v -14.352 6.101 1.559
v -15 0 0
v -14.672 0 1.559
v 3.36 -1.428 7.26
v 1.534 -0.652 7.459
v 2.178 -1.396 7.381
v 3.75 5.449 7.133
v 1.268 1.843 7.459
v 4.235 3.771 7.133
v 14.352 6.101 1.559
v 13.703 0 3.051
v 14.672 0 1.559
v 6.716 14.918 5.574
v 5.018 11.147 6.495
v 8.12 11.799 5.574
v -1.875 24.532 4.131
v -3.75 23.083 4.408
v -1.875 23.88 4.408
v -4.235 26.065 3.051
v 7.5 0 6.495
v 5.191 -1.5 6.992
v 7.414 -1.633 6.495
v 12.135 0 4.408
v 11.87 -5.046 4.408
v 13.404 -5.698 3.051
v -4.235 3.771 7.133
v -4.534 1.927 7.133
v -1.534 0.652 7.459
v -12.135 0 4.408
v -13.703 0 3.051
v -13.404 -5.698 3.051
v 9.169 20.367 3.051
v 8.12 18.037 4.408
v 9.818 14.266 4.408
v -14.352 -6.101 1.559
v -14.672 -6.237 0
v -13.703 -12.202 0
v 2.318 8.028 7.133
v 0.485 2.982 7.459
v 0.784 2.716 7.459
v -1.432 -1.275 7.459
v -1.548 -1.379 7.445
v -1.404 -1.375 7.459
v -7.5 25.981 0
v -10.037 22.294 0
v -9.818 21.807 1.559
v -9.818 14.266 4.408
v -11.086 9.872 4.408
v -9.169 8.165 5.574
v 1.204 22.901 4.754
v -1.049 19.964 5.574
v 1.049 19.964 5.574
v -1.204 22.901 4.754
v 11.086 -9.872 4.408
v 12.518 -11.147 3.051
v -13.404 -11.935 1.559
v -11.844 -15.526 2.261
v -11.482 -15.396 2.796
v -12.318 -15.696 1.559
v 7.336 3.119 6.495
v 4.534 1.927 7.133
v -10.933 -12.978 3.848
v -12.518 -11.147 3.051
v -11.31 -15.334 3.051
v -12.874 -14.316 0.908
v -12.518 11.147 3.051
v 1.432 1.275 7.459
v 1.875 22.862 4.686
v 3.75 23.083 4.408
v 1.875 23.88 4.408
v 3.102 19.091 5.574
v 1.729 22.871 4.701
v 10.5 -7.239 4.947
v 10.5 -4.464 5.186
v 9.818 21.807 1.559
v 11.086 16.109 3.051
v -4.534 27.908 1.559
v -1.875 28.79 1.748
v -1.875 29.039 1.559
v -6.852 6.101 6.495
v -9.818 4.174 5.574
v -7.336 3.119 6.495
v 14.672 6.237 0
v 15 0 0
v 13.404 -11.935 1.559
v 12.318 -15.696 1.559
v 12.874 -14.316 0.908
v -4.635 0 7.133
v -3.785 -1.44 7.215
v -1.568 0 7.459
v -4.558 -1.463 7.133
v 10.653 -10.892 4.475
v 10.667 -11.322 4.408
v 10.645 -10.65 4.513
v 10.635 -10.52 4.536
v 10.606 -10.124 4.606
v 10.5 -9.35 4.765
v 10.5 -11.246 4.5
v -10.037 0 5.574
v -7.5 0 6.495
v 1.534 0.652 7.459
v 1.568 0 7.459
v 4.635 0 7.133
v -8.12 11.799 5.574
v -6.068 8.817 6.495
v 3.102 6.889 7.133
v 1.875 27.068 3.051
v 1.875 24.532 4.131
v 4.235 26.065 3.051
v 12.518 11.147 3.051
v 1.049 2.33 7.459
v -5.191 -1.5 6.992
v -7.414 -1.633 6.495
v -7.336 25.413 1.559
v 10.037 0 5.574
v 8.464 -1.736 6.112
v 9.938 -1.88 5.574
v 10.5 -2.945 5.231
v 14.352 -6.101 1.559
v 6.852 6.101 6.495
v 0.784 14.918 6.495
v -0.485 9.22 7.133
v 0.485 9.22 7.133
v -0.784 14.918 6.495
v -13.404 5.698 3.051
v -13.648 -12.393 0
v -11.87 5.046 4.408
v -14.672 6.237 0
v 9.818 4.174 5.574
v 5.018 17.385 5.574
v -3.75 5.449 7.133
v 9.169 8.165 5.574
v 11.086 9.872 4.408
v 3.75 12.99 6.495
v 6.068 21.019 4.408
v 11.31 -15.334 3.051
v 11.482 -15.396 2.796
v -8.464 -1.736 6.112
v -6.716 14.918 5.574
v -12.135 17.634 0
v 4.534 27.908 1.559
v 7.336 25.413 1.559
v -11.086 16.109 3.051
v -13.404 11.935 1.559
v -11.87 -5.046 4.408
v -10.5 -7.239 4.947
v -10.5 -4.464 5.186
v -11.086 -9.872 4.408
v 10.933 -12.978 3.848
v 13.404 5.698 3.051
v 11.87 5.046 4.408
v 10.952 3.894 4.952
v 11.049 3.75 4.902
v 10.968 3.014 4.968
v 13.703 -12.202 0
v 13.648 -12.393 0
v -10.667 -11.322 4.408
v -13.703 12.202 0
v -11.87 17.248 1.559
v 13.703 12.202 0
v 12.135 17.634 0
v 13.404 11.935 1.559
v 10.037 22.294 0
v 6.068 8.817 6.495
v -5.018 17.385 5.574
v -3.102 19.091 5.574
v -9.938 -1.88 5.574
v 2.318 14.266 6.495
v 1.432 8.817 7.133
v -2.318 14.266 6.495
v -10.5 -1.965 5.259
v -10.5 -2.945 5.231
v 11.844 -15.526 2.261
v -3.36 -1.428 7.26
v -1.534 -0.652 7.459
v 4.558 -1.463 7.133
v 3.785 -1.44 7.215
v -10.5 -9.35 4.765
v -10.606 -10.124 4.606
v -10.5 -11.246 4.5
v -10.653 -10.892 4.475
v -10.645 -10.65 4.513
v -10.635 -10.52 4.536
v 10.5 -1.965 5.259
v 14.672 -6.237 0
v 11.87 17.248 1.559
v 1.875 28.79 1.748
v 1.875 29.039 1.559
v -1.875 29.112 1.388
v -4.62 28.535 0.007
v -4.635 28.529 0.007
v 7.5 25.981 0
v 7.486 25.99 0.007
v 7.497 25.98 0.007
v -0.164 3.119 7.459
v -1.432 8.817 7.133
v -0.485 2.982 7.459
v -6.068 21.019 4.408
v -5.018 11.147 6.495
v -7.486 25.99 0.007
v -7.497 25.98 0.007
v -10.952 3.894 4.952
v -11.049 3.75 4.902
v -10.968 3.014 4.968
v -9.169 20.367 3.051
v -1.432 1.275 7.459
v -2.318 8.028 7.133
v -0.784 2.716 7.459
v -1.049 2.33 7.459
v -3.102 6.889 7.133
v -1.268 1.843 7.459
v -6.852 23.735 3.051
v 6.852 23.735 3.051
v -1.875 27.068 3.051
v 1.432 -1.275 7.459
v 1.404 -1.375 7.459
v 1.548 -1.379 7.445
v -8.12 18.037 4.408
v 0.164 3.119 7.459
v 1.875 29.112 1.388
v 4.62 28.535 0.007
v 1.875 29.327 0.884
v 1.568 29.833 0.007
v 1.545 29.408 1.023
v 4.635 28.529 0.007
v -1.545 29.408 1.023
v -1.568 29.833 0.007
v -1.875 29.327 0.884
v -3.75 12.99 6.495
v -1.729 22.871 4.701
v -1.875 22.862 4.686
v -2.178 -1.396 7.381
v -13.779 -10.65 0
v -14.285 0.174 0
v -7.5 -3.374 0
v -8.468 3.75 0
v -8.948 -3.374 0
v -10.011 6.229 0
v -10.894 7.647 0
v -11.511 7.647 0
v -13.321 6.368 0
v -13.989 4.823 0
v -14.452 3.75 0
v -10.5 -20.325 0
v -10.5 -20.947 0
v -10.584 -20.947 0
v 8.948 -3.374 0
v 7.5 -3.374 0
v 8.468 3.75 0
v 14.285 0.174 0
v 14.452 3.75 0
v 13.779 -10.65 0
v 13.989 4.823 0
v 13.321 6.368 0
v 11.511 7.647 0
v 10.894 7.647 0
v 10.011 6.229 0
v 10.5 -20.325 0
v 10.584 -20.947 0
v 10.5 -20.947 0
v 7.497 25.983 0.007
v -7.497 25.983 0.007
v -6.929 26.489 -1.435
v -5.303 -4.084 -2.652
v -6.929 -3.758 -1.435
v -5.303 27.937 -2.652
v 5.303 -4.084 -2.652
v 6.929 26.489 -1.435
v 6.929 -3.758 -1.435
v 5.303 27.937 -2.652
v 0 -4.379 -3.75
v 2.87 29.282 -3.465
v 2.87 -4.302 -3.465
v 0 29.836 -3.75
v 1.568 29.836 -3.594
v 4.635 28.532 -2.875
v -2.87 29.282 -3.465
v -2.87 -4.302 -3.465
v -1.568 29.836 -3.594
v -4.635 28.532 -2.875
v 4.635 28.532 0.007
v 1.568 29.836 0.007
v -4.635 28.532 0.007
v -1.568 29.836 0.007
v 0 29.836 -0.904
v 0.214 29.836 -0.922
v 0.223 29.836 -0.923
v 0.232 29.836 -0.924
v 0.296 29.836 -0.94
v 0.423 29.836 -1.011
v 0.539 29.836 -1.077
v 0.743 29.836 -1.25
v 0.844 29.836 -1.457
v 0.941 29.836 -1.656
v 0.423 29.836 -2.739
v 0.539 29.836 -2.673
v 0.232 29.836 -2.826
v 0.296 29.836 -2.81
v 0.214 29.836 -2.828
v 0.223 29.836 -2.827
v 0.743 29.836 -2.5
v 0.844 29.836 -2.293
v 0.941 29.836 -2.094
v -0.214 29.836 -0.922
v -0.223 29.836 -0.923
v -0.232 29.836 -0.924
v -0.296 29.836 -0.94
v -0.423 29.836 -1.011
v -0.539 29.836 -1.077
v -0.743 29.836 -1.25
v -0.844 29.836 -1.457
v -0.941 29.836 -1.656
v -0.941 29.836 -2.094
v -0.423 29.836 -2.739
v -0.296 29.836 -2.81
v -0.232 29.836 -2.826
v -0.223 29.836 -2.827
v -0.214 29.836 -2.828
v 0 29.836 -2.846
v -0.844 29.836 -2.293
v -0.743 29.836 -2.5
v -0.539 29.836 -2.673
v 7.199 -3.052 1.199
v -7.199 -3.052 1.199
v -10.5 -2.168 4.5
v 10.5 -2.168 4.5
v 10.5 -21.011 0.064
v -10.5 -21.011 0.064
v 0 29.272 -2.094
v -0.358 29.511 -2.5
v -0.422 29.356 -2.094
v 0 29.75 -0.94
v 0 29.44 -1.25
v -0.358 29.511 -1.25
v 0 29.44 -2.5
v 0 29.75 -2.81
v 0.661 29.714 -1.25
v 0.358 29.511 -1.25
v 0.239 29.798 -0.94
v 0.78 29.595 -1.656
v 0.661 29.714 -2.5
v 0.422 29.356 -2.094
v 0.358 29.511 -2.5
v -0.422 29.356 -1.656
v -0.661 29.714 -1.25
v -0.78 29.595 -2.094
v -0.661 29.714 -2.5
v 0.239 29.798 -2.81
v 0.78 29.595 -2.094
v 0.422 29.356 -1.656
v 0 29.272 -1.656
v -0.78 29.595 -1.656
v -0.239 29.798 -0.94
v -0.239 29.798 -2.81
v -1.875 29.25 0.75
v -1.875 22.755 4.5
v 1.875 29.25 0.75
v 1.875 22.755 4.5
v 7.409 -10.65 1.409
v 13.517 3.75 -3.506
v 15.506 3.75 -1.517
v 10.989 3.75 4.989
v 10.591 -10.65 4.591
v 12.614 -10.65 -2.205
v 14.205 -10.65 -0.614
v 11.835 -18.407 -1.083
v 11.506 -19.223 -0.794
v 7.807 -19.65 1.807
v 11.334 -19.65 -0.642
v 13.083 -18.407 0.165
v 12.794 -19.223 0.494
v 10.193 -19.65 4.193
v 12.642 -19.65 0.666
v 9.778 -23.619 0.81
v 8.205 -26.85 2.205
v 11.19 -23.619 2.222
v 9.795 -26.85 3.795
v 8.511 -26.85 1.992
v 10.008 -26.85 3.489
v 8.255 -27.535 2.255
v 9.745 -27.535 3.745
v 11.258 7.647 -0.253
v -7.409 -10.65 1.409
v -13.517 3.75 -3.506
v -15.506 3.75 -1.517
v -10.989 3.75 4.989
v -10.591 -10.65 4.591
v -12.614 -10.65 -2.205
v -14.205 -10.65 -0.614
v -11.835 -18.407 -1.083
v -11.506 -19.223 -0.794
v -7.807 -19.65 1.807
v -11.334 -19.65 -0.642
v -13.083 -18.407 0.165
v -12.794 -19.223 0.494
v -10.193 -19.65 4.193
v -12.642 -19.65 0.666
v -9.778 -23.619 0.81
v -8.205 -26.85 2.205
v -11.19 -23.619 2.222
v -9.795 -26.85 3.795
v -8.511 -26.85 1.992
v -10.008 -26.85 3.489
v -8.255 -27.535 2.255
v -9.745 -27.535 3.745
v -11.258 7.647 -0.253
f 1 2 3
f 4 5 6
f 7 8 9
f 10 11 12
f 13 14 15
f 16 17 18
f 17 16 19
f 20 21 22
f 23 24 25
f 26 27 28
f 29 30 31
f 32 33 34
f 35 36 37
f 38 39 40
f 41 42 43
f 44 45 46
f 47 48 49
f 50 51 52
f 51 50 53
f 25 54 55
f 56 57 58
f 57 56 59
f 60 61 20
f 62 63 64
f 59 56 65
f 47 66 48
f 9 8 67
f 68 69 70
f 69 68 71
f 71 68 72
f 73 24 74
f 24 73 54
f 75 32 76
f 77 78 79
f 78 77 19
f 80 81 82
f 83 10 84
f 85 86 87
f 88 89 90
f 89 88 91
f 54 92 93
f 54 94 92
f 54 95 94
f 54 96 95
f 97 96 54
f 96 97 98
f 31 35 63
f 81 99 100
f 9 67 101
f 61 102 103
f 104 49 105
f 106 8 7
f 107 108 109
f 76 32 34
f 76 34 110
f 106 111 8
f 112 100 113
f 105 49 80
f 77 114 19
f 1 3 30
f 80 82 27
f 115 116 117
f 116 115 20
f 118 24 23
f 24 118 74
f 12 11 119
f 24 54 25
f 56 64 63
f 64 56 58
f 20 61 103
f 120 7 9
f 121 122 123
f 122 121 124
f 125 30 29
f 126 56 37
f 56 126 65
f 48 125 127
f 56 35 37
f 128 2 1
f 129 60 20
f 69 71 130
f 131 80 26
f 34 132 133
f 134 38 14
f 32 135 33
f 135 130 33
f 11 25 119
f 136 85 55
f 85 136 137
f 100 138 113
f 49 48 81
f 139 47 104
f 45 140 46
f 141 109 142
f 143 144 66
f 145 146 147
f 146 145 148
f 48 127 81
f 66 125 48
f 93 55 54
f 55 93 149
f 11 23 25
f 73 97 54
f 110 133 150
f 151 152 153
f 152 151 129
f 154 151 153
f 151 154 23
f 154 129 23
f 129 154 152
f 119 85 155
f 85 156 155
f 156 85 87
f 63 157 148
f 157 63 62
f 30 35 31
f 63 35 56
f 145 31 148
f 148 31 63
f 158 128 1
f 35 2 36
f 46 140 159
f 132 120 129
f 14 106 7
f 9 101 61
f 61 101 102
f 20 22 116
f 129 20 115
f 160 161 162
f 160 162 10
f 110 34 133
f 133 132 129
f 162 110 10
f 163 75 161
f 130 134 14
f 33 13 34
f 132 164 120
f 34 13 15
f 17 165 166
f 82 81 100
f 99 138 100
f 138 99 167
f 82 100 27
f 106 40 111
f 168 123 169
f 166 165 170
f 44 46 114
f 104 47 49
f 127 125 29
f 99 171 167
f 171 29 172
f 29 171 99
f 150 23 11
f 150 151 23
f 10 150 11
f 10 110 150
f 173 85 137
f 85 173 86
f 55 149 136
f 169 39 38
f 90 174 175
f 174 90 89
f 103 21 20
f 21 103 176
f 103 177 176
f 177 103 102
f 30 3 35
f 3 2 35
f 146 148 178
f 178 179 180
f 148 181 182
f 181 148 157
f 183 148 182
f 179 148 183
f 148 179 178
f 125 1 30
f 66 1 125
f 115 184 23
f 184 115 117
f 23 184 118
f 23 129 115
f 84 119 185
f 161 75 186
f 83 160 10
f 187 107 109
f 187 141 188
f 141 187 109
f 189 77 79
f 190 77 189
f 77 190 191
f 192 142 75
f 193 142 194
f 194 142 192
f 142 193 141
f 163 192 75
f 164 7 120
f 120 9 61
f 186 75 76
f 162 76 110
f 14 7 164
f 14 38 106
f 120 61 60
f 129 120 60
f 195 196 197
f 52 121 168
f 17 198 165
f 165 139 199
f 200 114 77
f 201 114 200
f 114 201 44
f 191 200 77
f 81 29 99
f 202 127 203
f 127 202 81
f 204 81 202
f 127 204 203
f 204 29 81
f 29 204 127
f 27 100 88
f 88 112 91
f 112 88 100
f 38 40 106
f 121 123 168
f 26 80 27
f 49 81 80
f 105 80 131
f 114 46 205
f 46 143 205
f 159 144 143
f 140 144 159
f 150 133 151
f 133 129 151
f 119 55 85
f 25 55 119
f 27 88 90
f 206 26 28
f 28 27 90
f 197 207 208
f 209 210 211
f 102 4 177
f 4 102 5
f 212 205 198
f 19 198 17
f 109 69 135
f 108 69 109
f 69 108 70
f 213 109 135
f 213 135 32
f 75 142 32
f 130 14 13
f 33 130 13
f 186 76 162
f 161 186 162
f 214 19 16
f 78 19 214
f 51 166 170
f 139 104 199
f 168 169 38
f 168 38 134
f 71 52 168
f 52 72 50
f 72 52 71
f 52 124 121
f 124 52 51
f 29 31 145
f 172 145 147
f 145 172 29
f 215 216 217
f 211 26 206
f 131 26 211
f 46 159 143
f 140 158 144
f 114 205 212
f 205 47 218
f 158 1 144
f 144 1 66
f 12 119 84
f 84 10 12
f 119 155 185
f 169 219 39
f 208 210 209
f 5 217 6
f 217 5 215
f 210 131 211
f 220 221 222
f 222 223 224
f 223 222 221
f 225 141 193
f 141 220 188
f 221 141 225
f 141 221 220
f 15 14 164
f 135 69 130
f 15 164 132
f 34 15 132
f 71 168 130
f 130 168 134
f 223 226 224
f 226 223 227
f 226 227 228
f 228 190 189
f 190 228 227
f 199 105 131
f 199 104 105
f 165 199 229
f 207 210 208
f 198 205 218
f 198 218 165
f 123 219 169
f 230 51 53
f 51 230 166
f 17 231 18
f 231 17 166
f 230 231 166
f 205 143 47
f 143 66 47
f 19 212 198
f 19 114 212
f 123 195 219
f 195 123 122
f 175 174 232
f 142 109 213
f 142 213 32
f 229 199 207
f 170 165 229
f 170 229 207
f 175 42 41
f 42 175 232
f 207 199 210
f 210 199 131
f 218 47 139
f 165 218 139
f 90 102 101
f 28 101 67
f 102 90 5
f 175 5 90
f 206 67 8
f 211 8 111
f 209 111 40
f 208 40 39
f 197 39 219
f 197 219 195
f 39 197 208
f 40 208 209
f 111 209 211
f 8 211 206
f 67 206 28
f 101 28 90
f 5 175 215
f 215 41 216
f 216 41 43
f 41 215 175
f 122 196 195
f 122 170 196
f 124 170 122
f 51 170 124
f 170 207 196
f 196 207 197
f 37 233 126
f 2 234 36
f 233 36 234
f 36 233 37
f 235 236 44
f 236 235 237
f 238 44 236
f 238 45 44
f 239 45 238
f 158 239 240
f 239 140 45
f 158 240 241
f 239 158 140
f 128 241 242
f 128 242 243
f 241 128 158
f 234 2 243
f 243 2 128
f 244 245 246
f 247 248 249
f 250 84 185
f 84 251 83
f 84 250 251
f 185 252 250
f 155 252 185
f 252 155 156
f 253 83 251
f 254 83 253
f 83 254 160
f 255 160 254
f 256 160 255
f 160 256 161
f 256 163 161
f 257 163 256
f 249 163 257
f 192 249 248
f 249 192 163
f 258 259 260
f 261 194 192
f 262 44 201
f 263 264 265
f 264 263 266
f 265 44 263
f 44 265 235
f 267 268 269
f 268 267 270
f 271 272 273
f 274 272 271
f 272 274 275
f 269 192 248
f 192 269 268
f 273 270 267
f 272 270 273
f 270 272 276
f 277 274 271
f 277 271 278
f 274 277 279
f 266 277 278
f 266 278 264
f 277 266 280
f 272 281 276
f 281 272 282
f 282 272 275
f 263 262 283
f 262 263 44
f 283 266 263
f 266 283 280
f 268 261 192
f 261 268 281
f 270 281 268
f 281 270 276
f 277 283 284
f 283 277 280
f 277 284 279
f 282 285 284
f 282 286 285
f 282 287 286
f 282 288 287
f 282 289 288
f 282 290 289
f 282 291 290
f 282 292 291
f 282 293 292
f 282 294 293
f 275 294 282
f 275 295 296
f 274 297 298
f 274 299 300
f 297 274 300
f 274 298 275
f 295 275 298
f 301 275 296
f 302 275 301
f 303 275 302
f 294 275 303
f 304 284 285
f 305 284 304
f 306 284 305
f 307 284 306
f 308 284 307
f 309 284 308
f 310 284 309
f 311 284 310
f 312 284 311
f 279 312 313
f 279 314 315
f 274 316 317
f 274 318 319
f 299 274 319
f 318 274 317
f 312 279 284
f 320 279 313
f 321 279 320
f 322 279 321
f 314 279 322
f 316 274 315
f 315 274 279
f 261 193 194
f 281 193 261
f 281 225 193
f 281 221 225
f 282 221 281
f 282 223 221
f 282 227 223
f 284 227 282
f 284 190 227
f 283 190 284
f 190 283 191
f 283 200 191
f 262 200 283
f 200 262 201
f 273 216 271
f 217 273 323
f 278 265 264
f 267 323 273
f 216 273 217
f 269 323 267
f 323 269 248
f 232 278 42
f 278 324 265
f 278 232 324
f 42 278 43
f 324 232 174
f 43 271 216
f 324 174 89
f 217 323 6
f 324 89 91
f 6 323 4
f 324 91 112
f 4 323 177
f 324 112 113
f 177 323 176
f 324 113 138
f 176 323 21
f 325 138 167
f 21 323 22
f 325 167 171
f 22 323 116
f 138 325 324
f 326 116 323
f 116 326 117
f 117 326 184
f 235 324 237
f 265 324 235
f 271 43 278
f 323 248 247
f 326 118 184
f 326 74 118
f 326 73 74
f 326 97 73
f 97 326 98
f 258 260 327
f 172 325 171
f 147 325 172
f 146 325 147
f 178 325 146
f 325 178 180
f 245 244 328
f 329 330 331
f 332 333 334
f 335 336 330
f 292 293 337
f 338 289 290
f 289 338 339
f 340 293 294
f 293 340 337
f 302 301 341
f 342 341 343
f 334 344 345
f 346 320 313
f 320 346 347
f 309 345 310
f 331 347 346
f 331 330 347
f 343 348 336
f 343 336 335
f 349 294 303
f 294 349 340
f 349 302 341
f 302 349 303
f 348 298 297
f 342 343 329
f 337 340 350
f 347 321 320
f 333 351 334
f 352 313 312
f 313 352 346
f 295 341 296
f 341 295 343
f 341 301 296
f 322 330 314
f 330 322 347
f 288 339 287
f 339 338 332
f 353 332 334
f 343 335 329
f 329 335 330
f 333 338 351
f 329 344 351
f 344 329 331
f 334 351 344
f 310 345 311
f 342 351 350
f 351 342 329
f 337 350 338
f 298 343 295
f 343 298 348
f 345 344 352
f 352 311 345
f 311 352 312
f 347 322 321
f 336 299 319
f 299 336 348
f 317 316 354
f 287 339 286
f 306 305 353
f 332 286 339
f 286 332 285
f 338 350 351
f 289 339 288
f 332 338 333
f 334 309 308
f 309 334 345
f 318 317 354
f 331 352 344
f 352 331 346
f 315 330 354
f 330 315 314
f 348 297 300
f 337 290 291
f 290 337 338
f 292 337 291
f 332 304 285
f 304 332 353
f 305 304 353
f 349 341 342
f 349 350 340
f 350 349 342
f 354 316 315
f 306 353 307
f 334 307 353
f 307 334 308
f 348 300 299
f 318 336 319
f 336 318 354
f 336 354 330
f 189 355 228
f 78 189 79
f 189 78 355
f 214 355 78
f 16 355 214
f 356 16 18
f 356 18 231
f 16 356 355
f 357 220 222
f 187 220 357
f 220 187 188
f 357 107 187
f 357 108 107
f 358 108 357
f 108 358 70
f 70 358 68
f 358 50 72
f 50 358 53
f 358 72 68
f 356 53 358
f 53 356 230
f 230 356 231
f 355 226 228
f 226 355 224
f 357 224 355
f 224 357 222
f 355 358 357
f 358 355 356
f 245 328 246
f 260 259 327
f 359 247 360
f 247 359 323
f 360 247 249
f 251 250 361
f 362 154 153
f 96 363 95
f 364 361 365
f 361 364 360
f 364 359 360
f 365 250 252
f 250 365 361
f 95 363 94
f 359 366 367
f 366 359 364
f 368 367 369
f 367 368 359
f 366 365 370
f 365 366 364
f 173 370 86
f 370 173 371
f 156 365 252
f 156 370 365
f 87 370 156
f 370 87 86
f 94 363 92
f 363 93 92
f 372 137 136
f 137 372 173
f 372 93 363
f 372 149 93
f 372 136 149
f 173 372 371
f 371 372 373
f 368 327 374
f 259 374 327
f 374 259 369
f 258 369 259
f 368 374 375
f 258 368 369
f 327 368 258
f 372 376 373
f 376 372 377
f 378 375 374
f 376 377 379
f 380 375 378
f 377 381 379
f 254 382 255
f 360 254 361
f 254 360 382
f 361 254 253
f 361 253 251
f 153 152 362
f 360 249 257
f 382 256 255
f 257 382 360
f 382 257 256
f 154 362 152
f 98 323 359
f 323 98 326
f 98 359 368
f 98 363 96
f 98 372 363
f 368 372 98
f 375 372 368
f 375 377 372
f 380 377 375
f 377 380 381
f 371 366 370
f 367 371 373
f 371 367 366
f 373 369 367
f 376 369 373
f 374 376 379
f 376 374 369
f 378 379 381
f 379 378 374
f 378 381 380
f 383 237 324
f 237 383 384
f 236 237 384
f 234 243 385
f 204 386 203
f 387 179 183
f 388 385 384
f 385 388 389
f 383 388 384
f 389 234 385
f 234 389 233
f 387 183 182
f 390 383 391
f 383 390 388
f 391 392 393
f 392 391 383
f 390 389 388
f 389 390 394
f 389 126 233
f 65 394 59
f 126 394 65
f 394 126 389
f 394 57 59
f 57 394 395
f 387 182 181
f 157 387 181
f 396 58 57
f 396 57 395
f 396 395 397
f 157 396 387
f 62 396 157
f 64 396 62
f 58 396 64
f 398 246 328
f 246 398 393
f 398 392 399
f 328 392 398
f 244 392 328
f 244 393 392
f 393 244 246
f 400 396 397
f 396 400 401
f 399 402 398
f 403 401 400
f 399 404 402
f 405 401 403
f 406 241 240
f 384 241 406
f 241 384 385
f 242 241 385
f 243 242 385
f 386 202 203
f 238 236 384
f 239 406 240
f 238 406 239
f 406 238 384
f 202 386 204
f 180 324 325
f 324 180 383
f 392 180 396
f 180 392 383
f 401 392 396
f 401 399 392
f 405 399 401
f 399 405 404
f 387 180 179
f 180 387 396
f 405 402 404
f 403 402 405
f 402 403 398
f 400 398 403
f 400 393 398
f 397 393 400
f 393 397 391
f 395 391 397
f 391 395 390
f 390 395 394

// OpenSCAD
module at_main_unscaled() {
    difference() {
        sphere(10);
        translate([-20,-20,-20])
            cube([40,40,20]);
    }

    difference() {
        intersection() {
            translate([0,20,0])
                rotate([90,0,0])
                    cylinder(40,5,5);
            translate([0,0,-20])
                cylinder(40,10,10);
        }
        translate([-20,-20,0.01])
            cube([40,40,20]);
    }
}


module at_main_minus() {
    translate([-14,-90,-10])
        rotate([-15,0,0])
            cube([28,80,80]);

    translate([0,40.5,-2.5])
        sphere(1.5, $fn=16);

    translate([-2.5,39,1])
        rotate([60,0,0])
            cube([5,5,10]);

    translate([0,-35,0])
        rotate([45,0,0])
            cube([40,10,40], center=true);
}

module at_nacelle_assembly() {
    translate([12,5,4])
        rotate([0,-45,0])
            at_nacelle_2();
    mirror([1,0,0])
        translate([12,5,4])
            rotate([0,-45,0])
                at_nacelle_2();
}

module at_nacelle_2() {
    scale([.75,1.2,2.4]) difference() {
        union() {
            rotate([90,0,0])
            union() {
                cylinder(16,5,4,$fn=6);
                translate([0,0,16])
                    cylinder(10,4,3,$fn=6);
                translate([0,0,26])
                    cylinder(8,3,2,$fn=6);
                translate([0,0,34])
                    cylinder(6,2,1,$fn=6);
            }

            rotate([90,0,0])
                sphere(5,$fn=6);
        }

        translate([-30,-50,0])
            cube(60);

        translate([-30,-24,-65])
            rotate([75,0,0])
                cube(60);
    }
}


module at_main() {
    union() {
        difference() {
            scale([2,4,1]) 
                at_main_unscaled();
            at_main_minus();
        }
        at_nacelle_assembly();
    }
}

module attack() {
    scale(.75) at_main();
}

attack();
